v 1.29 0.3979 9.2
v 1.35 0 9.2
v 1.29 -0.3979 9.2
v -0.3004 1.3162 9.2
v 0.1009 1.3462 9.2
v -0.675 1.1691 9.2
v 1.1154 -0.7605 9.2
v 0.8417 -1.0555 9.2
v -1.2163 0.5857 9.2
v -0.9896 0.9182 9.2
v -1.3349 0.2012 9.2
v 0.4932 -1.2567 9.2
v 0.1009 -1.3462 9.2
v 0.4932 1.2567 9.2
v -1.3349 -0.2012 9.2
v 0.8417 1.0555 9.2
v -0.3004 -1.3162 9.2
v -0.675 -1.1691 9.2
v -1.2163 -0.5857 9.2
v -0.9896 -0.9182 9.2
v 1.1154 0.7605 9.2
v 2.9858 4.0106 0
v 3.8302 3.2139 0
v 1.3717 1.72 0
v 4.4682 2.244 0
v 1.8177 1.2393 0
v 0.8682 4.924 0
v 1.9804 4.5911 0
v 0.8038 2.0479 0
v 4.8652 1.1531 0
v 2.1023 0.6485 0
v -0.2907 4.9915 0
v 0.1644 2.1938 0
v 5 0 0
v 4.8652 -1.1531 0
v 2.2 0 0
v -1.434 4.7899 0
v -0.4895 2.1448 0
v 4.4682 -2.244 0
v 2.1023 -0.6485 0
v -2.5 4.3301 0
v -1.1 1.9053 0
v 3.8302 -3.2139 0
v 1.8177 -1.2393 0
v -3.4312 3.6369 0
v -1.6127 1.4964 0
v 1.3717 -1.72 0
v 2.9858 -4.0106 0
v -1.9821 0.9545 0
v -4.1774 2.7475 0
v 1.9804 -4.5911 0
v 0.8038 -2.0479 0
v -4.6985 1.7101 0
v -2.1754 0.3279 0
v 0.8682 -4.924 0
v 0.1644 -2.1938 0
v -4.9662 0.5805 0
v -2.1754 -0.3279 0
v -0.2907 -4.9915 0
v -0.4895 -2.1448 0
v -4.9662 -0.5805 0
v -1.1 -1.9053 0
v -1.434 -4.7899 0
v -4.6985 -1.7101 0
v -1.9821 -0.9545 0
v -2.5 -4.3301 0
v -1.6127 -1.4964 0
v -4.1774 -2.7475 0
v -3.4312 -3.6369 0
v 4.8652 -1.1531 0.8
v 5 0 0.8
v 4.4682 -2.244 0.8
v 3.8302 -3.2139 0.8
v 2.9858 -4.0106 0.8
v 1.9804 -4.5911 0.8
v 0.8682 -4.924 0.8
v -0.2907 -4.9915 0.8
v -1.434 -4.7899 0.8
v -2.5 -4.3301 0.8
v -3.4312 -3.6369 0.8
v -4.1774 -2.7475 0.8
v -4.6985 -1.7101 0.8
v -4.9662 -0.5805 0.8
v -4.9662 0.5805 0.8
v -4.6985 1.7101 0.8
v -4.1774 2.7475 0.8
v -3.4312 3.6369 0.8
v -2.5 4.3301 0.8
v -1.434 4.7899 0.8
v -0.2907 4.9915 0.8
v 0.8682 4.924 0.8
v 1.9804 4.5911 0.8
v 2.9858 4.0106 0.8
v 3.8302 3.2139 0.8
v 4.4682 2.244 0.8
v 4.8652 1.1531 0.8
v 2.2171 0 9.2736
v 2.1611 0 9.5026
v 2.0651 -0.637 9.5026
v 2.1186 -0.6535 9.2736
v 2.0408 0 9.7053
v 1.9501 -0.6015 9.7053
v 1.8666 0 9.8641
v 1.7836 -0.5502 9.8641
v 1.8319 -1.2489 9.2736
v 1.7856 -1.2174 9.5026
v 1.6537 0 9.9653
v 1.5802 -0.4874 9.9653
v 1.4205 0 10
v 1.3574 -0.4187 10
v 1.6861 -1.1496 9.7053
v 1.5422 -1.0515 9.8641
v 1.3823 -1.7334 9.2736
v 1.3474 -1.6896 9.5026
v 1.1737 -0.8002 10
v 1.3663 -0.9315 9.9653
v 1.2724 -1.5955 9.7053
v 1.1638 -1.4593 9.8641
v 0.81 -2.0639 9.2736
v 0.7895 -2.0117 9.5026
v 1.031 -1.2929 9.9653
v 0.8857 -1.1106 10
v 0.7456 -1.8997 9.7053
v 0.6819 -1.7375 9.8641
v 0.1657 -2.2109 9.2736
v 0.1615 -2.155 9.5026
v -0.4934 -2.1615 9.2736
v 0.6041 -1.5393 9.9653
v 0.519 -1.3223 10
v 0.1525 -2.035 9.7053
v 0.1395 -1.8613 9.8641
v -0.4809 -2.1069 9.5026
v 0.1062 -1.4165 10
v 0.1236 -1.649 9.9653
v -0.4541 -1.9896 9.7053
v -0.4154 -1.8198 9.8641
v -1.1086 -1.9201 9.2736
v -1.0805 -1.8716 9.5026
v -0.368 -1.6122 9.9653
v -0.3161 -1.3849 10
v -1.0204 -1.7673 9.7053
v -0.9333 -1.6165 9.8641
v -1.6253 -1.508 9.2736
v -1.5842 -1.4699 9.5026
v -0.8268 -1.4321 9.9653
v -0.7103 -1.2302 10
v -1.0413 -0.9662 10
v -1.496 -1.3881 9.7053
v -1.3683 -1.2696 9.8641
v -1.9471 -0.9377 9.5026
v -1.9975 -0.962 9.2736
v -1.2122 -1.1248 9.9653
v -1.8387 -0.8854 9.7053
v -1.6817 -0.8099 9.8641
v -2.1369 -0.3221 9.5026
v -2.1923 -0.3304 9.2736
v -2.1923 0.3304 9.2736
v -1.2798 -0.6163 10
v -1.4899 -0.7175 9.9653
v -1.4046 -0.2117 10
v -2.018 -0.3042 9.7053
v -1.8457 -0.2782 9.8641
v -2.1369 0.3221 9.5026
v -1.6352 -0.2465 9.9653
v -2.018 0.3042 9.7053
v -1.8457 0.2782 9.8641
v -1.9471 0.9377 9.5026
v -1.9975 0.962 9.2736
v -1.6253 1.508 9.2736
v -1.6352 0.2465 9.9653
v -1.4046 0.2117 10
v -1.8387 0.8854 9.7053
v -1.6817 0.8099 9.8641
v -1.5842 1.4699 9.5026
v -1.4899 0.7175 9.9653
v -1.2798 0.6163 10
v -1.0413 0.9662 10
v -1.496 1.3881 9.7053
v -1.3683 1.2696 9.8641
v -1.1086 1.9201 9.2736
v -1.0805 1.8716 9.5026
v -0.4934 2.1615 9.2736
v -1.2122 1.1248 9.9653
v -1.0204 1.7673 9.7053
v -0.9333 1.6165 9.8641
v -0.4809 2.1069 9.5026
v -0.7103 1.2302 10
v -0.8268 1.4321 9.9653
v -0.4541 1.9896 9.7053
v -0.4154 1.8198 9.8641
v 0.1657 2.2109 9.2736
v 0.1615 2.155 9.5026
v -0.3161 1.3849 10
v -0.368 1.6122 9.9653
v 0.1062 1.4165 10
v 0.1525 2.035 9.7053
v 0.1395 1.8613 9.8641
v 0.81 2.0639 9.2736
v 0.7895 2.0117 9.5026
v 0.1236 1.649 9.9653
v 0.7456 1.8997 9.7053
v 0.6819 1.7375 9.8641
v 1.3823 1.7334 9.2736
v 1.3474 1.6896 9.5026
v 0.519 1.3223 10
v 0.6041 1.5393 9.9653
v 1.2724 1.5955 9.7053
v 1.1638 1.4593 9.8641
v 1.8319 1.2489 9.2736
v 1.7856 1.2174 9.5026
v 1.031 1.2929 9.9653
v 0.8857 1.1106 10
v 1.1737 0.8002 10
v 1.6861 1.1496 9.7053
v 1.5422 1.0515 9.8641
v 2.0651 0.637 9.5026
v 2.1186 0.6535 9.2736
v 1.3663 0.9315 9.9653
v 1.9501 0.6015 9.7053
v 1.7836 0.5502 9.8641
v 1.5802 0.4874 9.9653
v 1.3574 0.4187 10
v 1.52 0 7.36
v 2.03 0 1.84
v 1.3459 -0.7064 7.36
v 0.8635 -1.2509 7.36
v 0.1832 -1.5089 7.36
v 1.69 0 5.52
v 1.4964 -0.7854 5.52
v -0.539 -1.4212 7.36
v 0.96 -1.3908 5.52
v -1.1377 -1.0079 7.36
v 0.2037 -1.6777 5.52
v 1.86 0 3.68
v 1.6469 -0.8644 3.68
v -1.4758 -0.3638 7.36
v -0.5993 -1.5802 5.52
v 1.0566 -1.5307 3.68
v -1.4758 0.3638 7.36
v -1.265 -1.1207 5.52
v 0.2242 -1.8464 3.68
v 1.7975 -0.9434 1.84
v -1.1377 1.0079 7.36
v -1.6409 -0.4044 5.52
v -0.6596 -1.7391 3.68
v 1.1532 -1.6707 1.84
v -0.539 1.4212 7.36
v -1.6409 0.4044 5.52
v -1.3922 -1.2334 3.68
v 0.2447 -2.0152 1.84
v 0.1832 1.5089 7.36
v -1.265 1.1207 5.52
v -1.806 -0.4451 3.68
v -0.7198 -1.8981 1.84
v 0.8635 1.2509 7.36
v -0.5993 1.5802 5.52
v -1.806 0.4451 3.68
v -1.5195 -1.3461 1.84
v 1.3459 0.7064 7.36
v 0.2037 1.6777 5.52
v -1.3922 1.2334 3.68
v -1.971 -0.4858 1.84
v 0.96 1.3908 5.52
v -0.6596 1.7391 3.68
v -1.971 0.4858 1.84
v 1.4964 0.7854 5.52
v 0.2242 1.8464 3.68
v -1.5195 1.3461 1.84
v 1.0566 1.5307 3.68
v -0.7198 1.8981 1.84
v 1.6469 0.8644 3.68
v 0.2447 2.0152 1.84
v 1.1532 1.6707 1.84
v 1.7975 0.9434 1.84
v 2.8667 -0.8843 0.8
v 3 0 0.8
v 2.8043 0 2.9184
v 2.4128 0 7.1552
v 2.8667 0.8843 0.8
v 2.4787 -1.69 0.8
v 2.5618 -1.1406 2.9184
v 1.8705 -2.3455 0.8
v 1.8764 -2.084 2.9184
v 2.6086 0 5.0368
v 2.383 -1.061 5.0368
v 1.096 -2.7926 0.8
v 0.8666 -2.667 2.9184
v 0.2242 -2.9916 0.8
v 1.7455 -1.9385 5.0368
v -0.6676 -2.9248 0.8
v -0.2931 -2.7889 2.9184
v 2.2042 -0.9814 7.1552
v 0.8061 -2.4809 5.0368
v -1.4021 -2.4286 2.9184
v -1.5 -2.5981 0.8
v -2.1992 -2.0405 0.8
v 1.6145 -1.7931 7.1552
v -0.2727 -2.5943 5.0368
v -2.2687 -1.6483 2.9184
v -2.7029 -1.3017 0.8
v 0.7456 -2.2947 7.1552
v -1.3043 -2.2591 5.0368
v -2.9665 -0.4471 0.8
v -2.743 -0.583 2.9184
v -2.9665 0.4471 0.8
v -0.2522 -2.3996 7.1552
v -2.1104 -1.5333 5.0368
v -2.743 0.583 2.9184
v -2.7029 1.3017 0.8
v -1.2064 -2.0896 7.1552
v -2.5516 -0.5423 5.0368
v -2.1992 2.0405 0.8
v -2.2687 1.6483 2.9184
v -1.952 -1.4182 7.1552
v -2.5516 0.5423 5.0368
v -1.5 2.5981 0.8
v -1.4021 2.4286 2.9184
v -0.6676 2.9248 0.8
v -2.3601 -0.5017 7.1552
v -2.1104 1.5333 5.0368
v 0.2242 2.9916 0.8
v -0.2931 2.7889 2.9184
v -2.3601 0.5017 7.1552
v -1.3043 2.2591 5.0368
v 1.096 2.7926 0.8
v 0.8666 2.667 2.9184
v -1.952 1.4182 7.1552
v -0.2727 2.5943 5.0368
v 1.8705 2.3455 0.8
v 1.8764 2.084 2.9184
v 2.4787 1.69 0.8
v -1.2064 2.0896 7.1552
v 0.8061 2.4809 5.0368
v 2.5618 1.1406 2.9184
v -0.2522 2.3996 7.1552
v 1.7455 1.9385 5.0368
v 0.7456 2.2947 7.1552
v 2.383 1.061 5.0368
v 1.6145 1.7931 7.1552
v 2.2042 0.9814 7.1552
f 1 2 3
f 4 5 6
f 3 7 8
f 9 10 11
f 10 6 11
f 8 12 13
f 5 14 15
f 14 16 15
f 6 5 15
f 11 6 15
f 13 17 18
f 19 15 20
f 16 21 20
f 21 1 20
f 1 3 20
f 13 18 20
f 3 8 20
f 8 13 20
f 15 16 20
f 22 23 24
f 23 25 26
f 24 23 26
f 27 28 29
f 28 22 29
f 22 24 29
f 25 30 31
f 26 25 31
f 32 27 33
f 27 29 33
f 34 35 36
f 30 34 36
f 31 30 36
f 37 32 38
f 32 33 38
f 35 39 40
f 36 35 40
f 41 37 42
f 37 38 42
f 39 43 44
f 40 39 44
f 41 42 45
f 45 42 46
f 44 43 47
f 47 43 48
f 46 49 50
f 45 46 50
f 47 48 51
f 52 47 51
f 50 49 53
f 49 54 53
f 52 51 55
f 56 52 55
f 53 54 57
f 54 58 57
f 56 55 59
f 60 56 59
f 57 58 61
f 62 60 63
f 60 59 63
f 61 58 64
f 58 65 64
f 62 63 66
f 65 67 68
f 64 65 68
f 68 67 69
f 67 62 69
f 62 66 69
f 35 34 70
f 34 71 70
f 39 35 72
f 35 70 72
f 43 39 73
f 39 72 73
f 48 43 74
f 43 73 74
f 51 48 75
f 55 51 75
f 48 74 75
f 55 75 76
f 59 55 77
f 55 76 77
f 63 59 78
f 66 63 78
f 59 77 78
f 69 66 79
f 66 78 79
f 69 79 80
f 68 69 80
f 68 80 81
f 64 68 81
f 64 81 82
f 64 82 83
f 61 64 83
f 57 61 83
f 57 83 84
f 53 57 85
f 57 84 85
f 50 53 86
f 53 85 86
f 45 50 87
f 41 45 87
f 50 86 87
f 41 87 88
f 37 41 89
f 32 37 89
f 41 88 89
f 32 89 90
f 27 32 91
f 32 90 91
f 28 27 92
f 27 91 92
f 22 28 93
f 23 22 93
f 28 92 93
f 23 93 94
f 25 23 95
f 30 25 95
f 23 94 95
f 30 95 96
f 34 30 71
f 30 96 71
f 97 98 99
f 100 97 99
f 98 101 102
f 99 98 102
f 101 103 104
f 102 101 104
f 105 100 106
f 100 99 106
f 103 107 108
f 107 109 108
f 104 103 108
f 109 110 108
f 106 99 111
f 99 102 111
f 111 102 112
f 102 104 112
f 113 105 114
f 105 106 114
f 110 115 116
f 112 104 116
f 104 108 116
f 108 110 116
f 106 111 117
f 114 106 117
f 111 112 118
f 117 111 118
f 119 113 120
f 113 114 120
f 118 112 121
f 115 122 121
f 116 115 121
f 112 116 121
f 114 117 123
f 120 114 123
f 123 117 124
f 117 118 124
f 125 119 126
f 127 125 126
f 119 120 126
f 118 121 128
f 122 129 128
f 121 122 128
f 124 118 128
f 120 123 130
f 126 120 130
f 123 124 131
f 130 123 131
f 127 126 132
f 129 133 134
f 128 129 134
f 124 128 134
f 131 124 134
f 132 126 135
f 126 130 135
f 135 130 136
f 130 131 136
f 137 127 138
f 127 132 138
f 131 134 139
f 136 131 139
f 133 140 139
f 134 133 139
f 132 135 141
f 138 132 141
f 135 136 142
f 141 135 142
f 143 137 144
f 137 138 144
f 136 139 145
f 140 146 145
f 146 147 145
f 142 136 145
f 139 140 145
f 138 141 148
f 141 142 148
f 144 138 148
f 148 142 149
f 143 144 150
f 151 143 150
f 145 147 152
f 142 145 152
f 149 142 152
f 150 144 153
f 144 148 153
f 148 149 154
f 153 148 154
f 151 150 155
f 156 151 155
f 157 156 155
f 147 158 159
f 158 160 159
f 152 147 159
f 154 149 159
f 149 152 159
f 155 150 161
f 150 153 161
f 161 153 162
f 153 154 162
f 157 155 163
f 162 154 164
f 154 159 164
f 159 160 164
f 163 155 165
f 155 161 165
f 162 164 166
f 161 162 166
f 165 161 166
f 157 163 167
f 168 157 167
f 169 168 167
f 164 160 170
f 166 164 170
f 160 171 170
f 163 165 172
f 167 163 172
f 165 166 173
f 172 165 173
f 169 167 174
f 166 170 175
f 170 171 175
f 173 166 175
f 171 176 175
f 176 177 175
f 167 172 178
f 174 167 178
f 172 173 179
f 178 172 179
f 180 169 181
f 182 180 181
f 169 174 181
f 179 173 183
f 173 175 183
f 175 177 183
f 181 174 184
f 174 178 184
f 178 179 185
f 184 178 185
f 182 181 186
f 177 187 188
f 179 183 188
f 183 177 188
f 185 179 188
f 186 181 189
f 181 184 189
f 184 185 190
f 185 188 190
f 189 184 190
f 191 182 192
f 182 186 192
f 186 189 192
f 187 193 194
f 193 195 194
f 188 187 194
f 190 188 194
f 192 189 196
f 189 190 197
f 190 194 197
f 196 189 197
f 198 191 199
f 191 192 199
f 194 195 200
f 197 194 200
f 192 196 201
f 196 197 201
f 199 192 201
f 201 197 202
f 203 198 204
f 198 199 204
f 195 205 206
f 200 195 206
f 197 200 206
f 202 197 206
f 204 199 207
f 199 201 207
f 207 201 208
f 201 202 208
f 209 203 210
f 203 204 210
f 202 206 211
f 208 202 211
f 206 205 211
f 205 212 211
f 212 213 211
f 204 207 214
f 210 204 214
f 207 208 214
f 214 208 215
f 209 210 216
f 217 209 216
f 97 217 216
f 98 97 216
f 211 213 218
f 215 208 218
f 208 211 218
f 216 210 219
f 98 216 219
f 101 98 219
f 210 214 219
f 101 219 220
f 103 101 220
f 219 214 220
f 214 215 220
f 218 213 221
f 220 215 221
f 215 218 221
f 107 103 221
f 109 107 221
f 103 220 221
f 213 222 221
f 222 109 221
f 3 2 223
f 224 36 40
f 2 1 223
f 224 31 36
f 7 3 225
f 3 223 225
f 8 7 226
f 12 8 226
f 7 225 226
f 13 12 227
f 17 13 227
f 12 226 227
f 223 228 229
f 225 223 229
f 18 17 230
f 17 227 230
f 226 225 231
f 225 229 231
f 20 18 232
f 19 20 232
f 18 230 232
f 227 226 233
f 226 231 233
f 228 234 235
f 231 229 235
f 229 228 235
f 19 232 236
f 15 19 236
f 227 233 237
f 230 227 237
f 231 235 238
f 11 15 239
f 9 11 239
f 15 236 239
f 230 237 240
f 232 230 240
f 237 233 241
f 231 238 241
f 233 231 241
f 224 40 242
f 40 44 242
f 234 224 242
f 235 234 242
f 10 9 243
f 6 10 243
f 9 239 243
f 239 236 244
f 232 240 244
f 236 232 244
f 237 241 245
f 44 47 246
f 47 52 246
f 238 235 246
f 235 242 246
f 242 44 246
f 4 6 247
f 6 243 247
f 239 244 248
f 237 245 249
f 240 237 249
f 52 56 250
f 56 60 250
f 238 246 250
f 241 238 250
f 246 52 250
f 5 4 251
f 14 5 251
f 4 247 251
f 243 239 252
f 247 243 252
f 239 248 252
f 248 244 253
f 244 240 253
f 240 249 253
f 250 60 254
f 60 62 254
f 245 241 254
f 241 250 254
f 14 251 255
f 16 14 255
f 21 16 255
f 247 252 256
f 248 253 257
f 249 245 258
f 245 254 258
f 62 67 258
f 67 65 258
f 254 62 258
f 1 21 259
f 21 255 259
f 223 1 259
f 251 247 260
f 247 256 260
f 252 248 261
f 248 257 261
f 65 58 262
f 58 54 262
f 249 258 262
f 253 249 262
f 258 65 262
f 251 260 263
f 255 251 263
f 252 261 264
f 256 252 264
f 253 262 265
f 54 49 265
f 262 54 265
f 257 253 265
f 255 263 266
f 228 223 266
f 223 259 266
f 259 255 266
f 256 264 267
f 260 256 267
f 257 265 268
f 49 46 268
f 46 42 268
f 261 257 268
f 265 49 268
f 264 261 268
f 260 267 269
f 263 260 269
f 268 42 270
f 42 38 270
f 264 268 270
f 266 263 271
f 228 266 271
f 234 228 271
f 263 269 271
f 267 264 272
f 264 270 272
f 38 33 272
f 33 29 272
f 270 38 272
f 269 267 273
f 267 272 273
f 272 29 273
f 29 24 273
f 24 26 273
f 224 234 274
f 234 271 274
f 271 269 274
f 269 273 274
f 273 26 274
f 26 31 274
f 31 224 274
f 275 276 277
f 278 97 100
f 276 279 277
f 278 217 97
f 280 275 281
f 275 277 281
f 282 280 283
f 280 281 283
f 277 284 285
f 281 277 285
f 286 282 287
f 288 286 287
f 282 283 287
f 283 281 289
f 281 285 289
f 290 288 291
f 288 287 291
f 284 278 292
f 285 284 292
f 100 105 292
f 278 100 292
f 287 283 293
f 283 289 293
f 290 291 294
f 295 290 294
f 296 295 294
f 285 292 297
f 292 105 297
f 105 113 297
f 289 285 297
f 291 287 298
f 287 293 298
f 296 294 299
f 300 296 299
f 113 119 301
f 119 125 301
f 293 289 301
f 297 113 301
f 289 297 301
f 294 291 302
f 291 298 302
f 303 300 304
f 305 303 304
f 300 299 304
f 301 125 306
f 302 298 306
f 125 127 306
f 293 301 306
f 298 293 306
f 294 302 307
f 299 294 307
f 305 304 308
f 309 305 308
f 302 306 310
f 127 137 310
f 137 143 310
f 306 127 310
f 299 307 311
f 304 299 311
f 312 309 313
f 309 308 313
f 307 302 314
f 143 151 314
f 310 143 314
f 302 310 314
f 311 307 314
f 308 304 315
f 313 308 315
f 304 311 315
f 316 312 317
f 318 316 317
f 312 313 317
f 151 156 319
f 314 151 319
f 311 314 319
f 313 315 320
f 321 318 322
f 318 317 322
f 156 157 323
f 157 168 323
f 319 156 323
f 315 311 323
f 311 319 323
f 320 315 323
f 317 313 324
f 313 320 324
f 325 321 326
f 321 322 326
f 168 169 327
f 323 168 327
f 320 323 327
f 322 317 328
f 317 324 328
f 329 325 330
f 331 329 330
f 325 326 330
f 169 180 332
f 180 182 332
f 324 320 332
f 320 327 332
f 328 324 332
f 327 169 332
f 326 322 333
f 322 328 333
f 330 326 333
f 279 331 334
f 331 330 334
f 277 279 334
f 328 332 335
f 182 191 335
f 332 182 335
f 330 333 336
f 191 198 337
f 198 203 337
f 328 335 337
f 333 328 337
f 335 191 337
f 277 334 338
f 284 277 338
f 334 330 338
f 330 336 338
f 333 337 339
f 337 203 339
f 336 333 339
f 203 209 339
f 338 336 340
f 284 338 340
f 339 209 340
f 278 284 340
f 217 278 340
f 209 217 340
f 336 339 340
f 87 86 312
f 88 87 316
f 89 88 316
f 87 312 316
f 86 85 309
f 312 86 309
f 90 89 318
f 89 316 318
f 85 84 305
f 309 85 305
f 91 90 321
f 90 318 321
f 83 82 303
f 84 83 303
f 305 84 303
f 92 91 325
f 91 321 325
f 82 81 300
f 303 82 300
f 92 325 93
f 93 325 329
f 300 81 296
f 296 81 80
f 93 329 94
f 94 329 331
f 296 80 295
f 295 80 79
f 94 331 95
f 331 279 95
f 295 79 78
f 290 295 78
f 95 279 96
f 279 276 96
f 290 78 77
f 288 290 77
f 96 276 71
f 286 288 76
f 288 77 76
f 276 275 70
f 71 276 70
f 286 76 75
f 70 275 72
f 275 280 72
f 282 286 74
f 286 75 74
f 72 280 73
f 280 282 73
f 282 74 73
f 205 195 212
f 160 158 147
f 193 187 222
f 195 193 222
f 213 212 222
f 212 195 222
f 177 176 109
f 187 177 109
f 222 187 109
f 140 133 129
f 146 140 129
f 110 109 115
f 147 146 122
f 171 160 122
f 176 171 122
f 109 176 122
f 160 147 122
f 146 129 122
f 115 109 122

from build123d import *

# Parameters (mm, degrees)
F2_R = 0.8


with BuildPart() as f1:
    # F0 (on Front) → F1 (revolve)
    with BuildSketch(Plane.XZ):
        Polygon((2.2, 0), (5, 0), (5, 0.8), (3, 0.8), (2.15, 10), (0, 10), (0, 9.2), (1.35, 9.2), align=None)
    revolve(axis=Axis((0, 0, 4.745889), (0, 0, -1)))

    # F2
    f2_edges = [f1.edges().sort_by_distance(p)[0] for p in [
        (-2.15, 0, 10),
    ]]
    fillet(f2_edges, radius=F2_R)


solid = f1.part
